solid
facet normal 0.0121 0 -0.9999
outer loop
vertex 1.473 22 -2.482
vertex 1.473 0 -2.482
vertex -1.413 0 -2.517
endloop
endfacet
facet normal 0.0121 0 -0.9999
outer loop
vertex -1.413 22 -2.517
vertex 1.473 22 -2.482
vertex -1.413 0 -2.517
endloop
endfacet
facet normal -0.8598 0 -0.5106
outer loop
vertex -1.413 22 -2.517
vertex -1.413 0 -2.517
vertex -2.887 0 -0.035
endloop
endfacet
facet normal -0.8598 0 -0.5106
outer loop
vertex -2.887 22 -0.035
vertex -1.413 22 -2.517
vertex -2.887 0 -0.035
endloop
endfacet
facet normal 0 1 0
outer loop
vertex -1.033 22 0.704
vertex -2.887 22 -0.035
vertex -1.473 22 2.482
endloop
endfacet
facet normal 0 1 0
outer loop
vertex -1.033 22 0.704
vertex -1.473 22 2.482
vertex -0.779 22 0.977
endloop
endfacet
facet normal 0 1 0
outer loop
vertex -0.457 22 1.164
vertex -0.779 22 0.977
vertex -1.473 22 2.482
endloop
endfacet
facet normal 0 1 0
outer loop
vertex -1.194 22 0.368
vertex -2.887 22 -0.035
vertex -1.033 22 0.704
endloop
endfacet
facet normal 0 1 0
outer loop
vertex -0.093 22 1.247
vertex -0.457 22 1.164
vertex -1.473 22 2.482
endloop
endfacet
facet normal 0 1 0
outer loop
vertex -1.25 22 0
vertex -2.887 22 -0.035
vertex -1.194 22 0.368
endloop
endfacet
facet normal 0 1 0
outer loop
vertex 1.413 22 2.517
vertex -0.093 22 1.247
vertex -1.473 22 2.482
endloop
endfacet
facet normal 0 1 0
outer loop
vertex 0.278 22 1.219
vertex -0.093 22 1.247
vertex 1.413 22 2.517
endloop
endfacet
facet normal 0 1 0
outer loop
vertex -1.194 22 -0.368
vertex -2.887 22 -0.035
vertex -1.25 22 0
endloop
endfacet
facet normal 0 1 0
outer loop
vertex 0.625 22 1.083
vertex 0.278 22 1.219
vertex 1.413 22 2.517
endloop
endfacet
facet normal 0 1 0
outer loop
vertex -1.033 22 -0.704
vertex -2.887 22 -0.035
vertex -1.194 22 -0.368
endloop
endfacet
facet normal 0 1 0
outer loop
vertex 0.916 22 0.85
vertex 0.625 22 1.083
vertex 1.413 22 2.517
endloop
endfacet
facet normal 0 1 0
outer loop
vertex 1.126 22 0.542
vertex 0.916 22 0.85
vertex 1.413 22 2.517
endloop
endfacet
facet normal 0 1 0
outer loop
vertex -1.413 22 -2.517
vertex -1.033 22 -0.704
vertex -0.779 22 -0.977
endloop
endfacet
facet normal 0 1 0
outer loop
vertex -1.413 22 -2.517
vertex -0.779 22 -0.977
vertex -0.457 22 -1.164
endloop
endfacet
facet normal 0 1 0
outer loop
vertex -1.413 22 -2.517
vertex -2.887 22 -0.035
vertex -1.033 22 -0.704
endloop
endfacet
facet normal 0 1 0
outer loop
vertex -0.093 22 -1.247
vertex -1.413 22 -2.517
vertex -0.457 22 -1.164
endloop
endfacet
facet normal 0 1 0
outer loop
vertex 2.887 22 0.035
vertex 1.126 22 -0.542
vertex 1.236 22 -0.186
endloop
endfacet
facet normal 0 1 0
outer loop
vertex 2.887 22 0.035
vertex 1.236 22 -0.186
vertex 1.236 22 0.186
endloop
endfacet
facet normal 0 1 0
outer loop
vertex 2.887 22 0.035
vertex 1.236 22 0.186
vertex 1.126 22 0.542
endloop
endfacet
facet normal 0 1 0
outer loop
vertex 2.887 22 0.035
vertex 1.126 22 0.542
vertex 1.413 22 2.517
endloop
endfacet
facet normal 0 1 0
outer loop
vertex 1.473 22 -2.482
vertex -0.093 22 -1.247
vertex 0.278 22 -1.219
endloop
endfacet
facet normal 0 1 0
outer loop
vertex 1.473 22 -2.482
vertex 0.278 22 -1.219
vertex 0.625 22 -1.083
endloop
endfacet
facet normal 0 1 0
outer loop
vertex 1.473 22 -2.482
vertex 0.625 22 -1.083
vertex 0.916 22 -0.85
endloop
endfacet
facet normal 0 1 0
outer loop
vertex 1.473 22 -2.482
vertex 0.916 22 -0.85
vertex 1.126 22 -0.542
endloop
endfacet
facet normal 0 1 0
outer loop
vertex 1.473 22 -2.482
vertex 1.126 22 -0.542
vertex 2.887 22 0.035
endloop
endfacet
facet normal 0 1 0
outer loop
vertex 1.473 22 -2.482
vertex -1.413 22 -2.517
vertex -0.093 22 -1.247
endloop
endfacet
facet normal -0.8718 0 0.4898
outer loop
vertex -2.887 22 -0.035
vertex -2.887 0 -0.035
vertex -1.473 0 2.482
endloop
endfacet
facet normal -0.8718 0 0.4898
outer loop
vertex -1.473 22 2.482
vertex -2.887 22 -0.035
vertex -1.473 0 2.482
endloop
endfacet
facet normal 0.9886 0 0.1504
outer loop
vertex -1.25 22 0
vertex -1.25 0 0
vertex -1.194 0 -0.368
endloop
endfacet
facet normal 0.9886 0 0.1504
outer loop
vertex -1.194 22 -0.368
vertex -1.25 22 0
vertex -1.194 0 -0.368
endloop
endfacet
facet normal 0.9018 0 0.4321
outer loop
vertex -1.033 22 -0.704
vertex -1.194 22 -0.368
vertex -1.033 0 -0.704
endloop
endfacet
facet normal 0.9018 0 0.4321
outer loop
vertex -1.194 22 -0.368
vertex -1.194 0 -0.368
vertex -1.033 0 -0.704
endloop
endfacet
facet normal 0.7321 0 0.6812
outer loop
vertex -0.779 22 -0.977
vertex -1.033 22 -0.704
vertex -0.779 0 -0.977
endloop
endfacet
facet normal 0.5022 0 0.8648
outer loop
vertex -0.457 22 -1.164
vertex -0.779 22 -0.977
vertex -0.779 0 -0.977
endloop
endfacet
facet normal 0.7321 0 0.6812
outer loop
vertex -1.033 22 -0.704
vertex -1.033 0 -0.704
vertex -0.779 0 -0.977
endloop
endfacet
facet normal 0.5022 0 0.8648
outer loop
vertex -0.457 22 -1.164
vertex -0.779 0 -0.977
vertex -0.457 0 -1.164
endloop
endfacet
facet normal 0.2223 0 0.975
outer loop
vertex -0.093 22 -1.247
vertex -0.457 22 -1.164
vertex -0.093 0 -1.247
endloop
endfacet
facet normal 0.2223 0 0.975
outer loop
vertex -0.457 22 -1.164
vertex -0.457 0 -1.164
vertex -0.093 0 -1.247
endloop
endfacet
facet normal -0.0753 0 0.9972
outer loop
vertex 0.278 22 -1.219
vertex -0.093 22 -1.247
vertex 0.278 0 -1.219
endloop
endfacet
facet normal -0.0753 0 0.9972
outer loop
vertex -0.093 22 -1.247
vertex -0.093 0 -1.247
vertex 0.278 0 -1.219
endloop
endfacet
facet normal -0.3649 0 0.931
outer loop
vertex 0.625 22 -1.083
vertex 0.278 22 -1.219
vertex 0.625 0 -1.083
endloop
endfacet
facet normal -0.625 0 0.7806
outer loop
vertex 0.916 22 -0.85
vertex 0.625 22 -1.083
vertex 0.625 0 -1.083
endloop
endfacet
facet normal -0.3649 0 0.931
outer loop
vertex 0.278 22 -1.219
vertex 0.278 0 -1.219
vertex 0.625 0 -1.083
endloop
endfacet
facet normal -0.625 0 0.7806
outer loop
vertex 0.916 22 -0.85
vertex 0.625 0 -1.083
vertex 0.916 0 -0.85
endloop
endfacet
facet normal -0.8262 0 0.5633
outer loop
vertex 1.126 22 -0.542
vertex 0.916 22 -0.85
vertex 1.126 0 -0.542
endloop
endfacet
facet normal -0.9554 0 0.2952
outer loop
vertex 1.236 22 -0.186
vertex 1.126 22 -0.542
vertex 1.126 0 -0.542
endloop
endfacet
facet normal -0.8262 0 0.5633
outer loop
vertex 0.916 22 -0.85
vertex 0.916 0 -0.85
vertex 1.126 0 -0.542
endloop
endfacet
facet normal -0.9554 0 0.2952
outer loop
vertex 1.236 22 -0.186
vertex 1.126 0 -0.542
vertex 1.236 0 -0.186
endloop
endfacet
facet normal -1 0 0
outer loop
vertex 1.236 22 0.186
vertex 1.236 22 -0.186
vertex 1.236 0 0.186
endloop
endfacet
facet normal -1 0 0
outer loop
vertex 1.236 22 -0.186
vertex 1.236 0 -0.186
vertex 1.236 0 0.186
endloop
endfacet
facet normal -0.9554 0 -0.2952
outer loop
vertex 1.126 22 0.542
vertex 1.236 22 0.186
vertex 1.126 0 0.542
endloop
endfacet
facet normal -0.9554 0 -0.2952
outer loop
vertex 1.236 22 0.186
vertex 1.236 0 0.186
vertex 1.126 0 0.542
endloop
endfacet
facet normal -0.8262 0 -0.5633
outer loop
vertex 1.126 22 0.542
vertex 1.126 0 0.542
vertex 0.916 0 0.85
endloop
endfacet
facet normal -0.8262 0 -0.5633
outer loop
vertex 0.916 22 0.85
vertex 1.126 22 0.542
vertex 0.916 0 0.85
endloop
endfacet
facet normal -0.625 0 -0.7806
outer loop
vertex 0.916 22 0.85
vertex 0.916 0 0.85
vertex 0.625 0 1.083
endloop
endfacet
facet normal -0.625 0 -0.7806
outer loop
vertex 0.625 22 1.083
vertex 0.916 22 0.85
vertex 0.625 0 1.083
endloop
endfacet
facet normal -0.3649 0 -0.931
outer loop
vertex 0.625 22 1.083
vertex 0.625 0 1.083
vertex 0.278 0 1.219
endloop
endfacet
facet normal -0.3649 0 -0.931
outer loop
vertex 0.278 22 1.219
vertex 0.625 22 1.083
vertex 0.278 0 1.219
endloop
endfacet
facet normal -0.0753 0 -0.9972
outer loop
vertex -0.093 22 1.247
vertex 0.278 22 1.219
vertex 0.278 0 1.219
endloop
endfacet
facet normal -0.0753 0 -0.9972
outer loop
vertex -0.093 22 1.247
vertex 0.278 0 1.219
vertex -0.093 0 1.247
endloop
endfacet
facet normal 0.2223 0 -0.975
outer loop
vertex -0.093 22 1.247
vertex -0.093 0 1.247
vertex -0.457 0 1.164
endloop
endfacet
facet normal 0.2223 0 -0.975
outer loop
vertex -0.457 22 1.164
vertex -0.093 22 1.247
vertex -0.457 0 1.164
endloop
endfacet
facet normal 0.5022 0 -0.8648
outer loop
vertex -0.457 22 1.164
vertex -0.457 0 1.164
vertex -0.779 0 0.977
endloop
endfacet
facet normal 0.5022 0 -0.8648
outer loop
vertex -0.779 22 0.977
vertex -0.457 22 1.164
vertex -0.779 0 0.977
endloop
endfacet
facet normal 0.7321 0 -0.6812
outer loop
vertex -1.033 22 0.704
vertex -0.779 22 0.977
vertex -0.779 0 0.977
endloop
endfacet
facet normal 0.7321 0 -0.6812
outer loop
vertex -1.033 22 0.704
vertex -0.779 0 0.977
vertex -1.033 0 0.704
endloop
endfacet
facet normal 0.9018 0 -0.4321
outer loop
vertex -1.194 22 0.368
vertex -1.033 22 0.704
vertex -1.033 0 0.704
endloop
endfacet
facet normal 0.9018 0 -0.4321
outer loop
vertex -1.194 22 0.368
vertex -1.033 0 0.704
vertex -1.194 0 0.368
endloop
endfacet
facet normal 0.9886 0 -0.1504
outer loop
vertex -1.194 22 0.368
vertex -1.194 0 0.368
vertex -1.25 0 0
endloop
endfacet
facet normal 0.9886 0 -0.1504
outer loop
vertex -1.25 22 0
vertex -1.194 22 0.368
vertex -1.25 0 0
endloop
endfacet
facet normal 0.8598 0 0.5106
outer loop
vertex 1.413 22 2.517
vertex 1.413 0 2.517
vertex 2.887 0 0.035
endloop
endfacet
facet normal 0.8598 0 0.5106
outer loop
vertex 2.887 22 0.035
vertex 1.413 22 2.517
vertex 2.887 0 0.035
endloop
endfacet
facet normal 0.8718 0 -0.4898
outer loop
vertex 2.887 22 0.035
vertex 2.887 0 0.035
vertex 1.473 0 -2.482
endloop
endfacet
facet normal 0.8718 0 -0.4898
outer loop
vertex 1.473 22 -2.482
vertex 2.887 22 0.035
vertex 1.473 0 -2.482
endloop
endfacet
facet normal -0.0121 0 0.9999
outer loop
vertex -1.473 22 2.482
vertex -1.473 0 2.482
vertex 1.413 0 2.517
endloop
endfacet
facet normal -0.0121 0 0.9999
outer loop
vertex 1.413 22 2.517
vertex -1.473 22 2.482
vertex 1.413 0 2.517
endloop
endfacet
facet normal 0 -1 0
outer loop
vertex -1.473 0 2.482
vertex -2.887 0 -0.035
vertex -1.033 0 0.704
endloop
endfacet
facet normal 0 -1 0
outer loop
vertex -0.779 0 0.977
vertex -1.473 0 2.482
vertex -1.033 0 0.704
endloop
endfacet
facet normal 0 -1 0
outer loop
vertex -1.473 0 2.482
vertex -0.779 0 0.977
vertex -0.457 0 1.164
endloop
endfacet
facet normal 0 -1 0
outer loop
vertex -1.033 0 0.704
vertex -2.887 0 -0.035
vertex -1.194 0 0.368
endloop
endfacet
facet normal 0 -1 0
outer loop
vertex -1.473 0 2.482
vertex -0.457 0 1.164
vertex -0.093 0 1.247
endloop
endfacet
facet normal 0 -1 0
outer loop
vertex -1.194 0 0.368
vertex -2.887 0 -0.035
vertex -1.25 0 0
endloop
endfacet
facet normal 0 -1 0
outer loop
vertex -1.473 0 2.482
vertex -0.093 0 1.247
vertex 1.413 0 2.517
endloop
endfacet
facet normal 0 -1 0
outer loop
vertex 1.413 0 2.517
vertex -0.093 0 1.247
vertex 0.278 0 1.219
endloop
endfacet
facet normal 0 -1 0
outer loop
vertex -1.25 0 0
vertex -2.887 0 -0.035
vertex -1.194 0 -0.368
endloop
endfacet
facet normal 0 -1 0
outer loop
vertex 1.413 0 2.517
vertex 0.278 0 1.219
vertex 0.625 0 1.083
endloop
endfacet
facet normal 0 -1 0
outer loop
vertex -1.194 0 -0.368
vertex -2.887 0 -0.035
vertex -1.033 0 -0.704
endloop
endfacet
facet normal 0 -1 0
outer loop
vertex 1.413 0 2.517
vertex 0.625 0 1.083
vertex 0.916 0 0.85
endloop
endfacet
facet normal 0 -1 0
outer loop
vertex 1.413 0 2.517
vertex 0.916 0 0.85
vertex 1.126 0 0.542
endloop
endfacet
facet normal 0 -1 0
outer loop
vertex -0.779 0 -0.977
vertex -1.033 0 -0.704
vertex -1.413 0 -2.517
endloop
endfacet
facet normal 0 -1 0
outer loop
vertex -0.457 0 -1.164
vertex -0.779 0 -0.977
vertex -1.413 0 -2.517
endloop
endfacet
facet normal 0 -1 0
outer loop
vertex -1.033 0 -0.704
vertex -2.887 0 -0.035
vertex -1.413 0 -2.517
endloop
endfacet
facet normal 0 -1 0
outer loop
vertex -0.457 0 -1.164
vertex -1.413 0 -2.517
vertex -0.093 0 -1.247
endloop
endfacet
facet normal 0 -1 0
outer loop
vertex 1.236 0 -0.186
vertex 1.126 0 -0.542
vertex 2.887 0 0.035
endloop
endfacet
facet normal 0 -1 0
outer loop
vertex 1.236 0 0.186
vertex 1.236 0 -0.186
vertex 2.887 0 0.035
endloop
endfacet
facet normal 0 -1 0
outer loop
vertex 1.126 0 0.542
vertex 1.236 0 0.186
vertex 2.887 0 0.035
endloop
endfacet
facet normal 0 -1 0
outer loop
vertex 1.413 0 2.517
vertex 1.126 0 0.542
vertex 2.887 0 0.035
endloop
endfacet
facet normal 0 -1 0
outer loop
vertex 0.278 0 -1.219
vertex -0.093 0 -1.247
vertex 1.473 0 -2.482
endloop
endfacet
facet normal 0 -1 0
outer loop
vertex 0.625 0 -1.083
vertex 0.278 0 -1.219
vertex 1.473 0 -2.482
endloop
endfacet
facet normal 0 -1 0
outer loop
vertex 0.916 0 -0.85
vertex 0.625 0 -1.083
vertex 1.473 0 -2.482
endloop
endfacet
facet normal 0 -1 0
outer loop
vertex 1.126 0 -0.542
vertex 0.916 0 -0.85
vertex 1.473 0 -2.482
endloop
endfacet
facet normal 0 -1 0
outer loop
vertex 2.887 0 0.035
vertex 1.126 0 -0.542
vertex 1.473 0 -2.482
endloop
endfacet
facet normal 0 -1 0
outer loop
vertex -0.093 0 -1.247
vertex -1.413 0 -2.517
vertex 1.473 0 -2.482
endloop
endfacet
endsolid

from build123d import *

# Parameters (mm, degrees)
BOSS_EXTRUDE1_DEPTH       = 22
M3X0_5_TAPPED_HOLE1_D     = 2.5
M3X0_5_TAPPED_HOLE1_DEPTH = 22


with BuildPart() as part:
    # Sketch1 → Boss-Extrude1 (new body)
    with BuildSketch(Plane(origin=(0, 0, 0), x_dir=(1, 0, 0), z_dir=(0, 1, 0))):
        Polygon((1.413165118, -2.517200366), (2.886542022, -0.034763291), (1.473376905, 2.482437075), (-1.413165118, 2.517200366), (-2.886542022, 0.034763291), (-1.473376905, -2.482437075), align=None)
    extrude(amount=BOSS_EXTRUDE1_DEPTH)

    # M3x0.5 Tapped Hole1
    with Locations(Plane(origin=(0, 22, 0), x_dir=(1, 0, 0), z_dir=(0, 1, 0))):
        with Locations((0, 0)):
            Hole(M3X0_5_TAPPED_HOLE1_D / 2, depth=M3X0_5_TAPPED_HOLE1_DEPTH)


solid = part.part
